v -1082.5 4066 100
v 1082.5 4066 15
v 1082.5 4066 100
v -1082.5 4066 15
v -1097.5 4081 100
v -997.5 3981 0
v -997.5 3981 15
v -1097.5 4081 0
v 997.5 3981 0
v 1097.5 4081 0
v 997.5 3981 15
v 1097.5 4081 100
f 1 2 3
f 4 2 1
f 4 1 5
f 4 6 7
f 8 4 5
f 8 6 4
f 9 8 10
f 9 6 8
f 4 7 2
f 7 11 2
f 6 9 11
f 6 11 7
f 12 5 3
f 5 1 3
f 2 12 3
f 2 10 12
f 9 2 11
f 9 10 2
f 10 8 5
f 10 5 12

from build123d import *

# Parameters (mm, degrees)
F1_DEPTH = 15
F3_DEPTH = 85


with BuildPart() as f1:
    # F0 (on Top) → F1 (new body)
    with BuildSketch(Plane.XY):
        Polygon((-1097.5, 100), (1097.5, 100), (997.5, 200), (-997.5, 200), align=None)
    extrude(amount=F1_DEPTH)

    # F2 (on face) → F3 (join)
    with BuildSketch(Plane.XY.offset(15)):
        Polygon((-1097.5, 100), (1097.5, 100), (1082.5, 115), (-1082.5, 115), align=None)
    extrude(amount=F3_DEPTH)


with BuildPart() as f5_1:
    # F5: instance of F1
    add(f1.part.mirror(Plane(origin=(0, 2090.5, 50), x_dir=(1, 0, 0), z_dir=(0, -1, 0))))


solid = f5_1.part
